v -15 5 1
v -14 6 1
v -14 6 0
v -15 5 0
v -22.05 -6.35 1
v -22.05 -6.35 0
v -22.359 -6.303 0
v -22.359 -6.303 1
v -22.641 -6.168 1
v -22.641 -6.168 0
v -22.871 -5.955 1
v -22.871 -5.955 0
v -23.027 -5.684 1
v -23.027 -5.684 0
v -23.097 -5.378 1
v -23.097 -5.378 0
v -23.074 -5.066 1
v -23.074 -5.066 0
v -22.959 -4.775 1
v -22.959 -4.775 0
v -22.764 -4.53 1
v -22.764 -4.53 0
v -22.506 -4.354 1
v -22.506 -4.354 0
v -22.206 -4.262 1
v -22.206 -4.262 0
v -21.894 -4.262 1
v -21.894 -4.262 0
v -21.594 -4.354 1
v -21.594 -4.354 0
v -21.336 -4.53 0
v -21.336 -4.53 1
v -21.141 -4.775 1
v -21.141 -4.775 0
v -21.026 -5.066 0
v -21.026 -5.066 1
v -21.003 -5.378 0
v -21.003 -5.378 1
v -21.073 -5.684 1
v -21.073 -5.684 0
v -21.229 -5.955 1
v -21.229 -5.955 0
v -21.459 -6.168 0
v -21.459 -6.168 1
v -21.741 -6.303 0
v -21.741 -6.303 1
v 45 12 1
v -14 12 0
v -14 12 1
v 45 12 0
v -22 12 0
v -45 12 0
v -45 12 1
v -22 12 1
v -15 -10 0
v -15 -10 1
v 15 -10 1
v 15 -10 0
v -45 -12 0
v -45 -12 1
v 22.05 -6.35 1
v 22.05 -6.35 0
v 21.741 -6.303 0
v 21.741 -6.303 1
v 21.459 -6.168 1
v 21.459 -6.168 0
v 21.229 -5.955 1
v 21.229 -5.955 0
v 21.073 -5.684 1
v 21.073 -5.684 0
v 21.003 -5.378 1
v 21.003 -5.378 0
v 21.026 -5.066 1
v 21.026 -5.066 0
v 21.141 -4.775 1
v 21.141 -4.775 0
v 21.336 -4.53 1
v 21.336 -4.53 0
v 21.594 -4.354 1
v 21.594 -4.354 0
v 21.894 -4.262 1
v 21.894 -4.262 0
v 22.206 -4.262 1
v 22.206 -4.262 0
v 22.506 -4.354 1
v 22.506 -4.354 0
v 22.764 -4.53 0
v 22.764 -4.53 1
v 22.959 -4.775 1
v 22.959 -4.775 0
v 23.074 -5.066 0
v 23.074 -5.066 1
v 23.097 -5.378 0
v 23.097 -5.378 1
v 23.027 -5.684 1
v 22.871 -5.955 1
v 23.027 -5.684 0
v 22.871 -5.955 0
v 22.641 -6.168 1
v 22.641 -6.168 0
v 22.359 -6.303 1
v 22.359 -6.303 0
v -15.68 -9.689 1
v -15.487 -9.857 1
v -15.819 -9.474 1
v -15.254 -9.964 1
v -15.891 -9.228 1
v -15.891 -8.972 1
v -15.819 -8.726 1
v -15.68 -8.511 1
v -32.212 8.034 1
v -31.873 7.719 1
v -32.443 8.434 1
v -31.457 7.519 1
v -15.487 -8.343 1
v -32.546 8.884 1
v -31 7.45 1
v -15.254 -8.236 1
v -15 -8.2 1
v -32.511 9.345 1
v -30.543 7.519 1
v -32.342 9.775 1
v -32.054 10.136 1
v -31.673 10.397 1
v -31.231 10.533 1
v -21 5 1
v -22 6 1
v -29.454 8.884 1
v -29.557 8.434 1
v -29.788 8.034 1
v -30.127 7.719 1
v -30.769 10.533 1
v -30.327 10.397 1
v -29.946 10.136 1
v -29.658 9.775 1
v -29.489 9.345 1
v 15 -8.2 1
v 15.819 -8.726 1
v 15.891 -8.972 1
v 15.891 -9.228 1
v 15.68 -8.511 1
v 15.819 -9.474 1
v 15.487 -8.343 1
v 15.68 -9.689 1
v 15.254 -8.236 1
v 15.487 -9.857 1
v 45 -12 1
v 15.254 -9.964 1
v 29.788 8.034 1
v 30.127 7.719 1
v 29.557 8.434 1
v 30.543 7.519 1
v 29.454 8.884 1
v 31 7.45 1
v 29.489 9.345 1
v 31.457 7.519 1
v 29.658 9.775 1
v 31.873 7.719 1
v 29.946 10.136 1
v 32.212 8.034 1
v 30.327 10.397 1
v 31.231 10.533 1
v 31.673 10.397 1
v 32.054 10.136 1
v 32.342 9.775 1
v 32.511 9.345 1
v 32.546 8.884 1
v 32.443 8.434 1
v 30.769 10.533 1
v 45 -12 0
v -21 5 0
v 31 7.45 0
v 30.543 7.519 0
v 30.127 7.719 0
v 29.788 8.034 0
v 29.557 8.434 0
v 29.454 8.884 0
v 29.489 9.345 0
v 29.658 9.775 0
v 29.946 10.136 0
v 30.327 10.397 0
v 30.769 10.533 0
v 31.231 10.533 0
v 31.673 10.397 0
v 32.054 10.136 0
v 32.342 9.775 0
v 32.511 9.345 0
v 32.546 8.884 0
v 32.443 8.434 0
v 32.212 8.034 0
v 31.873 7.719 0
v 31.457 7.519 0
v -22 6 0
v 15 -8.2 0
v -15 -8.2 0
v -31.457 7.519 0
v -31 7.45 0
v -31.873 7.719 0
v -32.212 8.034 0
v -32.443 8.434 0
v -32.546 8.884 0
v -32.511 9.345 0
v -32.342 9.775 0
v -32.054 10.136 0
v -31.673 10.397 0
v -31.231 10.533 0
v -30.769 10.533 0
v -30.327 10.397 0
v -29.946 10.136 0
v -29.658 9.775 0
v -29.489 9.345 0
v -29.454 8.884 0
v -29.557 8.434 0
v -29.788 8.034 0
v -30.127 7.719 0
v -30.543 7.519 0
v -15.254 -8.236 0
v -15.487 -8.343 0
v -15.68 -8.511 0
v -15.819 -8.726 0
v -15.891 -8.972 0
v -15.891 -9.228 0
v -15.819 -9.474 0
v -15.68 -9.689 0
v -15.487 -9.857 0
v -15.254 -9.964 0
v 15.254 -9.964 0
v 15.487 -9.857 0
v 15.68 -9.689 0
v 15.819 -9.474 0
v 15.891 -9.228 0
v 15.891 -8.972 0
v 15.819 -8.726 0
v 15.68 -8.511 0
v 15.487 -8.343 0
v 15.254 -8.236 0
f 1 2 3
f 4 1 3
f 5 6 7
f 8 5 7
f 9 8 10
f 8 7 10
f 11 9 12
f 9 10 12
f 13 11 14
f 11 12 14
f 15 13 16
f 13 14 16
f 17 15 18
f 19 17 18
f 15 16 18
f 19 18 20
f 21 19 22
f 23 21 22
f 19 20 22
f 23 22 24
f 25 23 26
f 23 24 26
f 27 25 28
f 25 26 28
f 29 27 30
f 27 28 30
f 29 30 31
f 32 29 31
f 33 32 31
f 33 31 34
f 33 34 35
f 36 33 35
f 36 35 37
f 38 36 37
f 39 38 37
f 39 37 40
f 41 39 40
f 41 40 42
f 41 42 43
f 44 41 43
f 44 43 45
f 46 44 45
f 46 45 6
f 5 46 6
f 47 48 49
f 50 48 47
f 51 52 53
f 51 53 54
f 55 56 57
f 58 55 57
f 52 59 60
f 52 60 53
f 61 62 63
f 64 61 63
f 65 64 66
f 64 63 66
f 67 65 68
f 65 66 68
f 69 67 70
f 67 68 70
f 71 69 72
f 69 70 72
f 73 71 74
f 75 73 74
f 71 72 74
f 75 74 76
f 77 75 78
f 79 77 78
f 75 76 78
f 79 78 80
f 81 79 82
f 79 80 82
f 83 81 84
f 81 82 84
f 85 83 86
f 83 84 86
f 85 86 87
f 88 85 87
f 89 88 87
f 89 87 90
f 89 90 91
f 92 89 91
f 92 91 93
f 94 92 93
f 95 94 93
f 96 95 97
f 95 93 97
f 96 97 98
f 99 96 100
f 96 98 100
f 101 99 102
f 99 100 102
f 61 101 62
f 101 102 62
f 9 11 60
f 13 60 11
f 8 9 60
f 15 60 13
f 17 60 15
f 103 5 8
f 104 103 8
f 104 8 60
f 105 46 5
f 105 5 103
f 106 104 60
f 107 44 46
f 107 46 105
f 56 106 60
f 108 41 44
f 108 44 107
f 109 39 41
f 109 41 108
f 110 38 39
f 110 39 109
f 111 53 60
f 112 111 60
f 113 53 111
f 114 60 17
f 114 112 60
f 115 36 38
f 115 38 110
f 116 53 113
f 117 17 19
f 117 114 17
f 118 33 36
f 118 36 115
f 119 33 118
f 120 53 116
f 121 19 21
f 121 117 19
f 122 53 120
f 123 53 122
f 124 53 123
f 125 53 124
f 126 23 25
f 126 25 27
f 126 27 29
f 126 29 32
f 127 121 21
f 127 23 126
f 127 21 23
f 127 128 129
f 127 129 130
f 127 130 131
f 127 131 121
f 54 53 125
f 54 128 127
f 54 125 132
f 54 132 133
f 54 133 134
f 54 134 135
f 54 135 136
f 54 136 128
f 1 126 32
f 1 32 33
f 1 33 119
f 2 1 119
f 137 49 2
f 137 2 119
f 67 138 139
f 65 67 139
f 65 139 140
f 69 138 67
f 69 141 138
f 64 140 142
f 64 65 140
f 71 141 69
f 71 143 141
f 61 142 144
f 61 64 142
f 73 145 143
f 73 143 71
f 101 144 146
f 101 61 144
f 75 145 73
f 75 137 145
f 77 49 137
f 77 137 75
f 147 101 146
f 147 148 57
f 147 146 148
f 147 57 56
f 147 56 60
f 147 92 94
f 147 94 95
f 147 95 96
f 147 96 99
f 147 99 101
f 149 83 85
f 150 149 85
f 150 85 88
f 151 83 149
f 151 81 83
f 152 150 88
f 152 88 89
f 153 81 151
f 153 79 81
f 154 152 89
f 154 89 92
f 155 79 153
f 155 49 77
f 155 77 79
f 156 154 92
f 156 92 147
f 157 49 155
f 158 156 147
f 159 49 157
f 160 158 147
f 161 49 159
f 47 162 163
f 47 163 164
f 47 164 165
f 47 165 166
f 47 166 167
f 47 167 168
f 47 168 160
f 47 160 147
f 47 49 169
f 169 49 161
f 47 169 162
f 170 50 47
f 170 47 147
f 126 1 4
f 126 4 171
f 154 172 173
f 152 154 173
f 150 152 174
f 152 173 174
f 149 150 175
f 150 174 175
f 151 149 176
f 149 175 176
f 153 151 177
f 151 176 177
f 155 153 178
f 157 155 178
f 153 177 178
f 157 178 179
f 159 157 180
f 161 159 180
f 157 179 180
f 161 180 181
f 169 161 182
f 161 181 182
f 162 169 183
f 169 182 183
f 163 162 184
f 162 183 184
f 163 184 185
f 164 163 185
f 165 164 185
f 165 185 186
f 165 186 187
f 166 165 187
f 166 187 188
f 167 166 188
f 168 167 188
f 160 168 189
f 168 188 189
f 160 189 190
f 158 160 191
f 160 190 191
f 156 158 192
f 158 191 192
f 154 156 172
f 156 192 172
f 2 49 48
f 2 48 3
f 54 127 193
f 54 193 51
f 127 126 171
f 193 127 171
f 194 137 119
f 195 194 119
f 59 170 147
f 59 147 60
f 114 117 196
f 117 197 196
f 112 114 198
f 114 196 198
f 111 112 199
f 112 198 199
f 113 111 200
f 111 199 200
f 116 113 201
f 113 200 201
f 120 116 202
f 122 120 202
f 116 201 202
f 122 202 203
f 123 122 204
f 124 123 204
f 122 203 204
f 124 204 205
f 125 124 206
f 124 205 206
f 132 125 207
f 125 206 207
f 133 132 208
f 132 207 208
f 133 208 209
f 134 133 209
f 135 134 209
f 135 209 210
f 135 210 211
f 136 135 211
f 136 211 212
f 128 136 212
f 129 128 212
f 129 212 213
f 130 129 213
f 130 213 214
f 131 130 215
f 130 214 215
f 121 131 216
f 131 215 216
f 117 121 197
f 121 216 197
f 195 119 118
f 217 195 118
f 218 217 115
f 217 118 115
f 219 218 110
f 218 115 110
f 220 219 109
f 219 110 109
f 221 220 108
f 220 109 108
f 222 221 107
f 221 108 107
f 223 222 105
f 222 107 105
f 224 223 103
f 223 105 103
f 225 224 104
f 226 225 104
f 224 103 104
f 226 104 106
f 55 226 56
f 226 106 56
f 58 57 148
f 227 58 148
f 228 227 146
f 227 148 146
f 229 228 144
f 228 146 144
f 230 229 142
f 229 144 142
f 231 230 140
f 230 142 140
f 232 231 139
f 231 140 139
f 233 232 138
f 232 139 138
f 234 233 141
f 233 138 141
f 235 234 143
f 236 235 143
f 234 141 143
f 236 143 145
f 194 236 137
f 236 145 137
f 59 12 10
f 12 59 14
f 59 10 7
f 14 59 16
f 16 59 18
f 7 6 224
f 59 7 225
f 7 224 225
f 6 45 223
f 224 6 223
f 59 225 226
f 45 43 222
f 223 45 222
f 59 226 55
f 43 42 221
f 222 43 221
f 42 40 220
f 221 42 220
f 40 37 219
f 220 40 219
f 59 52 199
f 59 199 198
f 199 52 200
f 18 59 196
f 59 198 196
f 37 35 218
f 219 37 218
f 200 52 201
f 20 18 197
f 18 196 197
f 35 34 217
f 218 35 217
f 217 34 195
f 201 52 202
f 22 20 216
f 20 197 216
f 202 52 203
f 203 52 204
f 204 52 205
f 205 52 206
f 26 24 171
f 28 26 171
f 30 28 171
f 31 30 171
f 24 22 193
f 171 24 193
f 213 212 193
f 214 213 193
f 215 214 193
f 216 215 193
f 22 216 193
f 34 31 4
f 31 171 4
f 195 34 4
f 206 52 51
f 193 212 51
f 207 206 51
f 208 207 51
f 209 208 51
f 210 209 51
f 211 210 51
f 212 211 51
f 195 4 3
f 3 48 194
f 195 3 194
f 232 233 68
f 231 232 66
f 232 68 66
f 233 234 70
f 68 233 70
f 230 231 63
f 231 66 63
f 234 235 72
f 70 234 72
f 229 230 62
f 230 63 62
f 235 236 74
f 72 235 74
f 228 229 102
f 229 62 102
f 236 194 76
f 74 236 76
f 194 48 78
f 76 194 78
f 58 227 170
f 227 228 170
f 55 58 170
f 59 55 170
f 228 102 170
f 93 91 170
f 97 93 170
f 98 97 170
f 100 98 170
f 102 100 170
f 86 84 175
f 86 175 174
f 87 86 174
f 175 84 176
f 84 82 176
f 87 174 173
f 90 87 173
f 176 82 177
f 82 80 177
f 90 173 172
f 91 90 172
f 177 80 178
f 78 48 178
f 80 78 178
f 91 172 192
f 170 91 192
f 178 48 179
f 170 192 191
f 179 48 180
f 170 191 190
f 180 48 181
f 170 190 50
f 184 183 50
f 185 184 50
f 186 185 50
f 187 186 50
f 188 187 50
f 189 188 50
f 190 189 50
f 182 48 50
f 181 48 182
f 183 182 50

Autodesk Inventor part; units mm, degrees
ref_plane "YZ Plane" through (0, 0, 0) normal (1, 0, 0) x (0, 1, 0)
ref_plane "XZ Plane" through (0, 0, 0) normal (0, 1, 0) x (-1, 0, 0)
ref_plane "XY Plane" through (0, 0, 0) normal (0, 0, 1) x (1, 0, 0)
sketch "Skizze1" plane through (0, 0, 0) normal (0, 0, 1) x (1, 0, 0)
  line L0 (-45, 12) -> (45, 12)
  line L1 (45, 12) -> (45, -12)
  line L2 (45, -12) -> (-45, -12)
  line L3 (-45, -12) -> (-45, 12)
  line L4 (-45, 12) -> (45, -12) construction
  line L5 (45, 12) -> (-45, -12) construction
  point P0 (0, 0)
  dimension "d0" = 24
  dimension "d1" = 90
extrude "Extrusion1" add sketch "Skizze1" along normal blind 1
sketch "Skizze4" plane through (0, 0, 1) normal (0, 0, 1) x (1, 0, 0)
  line L0 (15, -9.1) -> (-15, -9.1) construction
  line L1 (15, -8.2) -> (-15, -8.2)
  line L2 (-15, -10) -> (15, -10)
  arc A0 (15, -10) -> (15, -8.2) centre (15, -9.1) ccw
  arc A1 (-15, -8.2) -> (-15, -10) centre (-15, -9.1) ccw
  line L3 (0, 17) -> (0, -18) projected
  line L4 (-45, -12) -> (45, -12) projected
  point P0 (0, 0)
  point P1 (0, -9.1)
  dimension "d25" = 1.8
  dimension "d26" = 30
  dimension "d27" = 2
extrude "Extrusion2" cut sketch "Skizze4" against normal through all
sketch "Skizze2" plane through (0, 0, 1) normal (0, 0, 1) x (1, 0, 0)
  line L0 (31, 9) -> (-31, 9) construction
  line L1 (45, 12) -> (-45, 12) projected
  line L2 (0, 20.4) -> (0, -17.4) projected
  line L3 (-45, -12) -> (45, -12) projected
  dimension "d5" = 62
  dimension "d48" = 21
hole "Bohrung1" at (-31, 9, 1) at (31, 9, 1) direction (0, 0, -1) diameter 3.1 end through all
sketch "Skizze5" plane through (0, 0, 1) normal (0, 0, 1) x (1, 0, 0)
  line L0 (-45, -12) -> (45, -12) projected
  line L1 (0, 17.4) -> (0, -20.4) projected
  point P0 (0, 0)
  point P1 (22.05, -5.3)
  point P2 (-22.05, -5.3)
  dimension "d30" = 6.7
  dimension "d31" = 44.1
hole "Bohrung3" at (22.05, -5.3, 1) at (-22.05, -5.3, 1) direction (0, 0, -1) diameter 2.1 end through all
sketch "Skizze7" plane through (0, 0, 1) normal (0, 0, 1) x (1, 0, 0)
  line L0 (0, 20.4) -> (0, -17.4) projected
  line L1 (-45, -12) -> (45, -12) projected
  line L2 (-22, 12) -> (-14, 12)
  line L3 (-14, 12) -> (-14, 5)
  line L4 (-14, 5) -> (-22, 5)
  line L5 (-22, 5) -> (-22, 12)
  line L6 (-18, 5) -> (-18, 12) construction
  line L7 (45, 12) -> (-45, 12) construction
  point P0 (0, 0)
  dimension "d49" = 18
  dimension "d50" = 17
  dimension "d51" = 8
extrude "Extrusion4" cut sketch "Skizze7" against normal through all
chamfer "Fase1" distance 1 angle 45 2 edges at (-22, 5, 0.5) (-14, 5, 0.5)
properties part number "Ballsensorplatine" material "Phenolharz"
